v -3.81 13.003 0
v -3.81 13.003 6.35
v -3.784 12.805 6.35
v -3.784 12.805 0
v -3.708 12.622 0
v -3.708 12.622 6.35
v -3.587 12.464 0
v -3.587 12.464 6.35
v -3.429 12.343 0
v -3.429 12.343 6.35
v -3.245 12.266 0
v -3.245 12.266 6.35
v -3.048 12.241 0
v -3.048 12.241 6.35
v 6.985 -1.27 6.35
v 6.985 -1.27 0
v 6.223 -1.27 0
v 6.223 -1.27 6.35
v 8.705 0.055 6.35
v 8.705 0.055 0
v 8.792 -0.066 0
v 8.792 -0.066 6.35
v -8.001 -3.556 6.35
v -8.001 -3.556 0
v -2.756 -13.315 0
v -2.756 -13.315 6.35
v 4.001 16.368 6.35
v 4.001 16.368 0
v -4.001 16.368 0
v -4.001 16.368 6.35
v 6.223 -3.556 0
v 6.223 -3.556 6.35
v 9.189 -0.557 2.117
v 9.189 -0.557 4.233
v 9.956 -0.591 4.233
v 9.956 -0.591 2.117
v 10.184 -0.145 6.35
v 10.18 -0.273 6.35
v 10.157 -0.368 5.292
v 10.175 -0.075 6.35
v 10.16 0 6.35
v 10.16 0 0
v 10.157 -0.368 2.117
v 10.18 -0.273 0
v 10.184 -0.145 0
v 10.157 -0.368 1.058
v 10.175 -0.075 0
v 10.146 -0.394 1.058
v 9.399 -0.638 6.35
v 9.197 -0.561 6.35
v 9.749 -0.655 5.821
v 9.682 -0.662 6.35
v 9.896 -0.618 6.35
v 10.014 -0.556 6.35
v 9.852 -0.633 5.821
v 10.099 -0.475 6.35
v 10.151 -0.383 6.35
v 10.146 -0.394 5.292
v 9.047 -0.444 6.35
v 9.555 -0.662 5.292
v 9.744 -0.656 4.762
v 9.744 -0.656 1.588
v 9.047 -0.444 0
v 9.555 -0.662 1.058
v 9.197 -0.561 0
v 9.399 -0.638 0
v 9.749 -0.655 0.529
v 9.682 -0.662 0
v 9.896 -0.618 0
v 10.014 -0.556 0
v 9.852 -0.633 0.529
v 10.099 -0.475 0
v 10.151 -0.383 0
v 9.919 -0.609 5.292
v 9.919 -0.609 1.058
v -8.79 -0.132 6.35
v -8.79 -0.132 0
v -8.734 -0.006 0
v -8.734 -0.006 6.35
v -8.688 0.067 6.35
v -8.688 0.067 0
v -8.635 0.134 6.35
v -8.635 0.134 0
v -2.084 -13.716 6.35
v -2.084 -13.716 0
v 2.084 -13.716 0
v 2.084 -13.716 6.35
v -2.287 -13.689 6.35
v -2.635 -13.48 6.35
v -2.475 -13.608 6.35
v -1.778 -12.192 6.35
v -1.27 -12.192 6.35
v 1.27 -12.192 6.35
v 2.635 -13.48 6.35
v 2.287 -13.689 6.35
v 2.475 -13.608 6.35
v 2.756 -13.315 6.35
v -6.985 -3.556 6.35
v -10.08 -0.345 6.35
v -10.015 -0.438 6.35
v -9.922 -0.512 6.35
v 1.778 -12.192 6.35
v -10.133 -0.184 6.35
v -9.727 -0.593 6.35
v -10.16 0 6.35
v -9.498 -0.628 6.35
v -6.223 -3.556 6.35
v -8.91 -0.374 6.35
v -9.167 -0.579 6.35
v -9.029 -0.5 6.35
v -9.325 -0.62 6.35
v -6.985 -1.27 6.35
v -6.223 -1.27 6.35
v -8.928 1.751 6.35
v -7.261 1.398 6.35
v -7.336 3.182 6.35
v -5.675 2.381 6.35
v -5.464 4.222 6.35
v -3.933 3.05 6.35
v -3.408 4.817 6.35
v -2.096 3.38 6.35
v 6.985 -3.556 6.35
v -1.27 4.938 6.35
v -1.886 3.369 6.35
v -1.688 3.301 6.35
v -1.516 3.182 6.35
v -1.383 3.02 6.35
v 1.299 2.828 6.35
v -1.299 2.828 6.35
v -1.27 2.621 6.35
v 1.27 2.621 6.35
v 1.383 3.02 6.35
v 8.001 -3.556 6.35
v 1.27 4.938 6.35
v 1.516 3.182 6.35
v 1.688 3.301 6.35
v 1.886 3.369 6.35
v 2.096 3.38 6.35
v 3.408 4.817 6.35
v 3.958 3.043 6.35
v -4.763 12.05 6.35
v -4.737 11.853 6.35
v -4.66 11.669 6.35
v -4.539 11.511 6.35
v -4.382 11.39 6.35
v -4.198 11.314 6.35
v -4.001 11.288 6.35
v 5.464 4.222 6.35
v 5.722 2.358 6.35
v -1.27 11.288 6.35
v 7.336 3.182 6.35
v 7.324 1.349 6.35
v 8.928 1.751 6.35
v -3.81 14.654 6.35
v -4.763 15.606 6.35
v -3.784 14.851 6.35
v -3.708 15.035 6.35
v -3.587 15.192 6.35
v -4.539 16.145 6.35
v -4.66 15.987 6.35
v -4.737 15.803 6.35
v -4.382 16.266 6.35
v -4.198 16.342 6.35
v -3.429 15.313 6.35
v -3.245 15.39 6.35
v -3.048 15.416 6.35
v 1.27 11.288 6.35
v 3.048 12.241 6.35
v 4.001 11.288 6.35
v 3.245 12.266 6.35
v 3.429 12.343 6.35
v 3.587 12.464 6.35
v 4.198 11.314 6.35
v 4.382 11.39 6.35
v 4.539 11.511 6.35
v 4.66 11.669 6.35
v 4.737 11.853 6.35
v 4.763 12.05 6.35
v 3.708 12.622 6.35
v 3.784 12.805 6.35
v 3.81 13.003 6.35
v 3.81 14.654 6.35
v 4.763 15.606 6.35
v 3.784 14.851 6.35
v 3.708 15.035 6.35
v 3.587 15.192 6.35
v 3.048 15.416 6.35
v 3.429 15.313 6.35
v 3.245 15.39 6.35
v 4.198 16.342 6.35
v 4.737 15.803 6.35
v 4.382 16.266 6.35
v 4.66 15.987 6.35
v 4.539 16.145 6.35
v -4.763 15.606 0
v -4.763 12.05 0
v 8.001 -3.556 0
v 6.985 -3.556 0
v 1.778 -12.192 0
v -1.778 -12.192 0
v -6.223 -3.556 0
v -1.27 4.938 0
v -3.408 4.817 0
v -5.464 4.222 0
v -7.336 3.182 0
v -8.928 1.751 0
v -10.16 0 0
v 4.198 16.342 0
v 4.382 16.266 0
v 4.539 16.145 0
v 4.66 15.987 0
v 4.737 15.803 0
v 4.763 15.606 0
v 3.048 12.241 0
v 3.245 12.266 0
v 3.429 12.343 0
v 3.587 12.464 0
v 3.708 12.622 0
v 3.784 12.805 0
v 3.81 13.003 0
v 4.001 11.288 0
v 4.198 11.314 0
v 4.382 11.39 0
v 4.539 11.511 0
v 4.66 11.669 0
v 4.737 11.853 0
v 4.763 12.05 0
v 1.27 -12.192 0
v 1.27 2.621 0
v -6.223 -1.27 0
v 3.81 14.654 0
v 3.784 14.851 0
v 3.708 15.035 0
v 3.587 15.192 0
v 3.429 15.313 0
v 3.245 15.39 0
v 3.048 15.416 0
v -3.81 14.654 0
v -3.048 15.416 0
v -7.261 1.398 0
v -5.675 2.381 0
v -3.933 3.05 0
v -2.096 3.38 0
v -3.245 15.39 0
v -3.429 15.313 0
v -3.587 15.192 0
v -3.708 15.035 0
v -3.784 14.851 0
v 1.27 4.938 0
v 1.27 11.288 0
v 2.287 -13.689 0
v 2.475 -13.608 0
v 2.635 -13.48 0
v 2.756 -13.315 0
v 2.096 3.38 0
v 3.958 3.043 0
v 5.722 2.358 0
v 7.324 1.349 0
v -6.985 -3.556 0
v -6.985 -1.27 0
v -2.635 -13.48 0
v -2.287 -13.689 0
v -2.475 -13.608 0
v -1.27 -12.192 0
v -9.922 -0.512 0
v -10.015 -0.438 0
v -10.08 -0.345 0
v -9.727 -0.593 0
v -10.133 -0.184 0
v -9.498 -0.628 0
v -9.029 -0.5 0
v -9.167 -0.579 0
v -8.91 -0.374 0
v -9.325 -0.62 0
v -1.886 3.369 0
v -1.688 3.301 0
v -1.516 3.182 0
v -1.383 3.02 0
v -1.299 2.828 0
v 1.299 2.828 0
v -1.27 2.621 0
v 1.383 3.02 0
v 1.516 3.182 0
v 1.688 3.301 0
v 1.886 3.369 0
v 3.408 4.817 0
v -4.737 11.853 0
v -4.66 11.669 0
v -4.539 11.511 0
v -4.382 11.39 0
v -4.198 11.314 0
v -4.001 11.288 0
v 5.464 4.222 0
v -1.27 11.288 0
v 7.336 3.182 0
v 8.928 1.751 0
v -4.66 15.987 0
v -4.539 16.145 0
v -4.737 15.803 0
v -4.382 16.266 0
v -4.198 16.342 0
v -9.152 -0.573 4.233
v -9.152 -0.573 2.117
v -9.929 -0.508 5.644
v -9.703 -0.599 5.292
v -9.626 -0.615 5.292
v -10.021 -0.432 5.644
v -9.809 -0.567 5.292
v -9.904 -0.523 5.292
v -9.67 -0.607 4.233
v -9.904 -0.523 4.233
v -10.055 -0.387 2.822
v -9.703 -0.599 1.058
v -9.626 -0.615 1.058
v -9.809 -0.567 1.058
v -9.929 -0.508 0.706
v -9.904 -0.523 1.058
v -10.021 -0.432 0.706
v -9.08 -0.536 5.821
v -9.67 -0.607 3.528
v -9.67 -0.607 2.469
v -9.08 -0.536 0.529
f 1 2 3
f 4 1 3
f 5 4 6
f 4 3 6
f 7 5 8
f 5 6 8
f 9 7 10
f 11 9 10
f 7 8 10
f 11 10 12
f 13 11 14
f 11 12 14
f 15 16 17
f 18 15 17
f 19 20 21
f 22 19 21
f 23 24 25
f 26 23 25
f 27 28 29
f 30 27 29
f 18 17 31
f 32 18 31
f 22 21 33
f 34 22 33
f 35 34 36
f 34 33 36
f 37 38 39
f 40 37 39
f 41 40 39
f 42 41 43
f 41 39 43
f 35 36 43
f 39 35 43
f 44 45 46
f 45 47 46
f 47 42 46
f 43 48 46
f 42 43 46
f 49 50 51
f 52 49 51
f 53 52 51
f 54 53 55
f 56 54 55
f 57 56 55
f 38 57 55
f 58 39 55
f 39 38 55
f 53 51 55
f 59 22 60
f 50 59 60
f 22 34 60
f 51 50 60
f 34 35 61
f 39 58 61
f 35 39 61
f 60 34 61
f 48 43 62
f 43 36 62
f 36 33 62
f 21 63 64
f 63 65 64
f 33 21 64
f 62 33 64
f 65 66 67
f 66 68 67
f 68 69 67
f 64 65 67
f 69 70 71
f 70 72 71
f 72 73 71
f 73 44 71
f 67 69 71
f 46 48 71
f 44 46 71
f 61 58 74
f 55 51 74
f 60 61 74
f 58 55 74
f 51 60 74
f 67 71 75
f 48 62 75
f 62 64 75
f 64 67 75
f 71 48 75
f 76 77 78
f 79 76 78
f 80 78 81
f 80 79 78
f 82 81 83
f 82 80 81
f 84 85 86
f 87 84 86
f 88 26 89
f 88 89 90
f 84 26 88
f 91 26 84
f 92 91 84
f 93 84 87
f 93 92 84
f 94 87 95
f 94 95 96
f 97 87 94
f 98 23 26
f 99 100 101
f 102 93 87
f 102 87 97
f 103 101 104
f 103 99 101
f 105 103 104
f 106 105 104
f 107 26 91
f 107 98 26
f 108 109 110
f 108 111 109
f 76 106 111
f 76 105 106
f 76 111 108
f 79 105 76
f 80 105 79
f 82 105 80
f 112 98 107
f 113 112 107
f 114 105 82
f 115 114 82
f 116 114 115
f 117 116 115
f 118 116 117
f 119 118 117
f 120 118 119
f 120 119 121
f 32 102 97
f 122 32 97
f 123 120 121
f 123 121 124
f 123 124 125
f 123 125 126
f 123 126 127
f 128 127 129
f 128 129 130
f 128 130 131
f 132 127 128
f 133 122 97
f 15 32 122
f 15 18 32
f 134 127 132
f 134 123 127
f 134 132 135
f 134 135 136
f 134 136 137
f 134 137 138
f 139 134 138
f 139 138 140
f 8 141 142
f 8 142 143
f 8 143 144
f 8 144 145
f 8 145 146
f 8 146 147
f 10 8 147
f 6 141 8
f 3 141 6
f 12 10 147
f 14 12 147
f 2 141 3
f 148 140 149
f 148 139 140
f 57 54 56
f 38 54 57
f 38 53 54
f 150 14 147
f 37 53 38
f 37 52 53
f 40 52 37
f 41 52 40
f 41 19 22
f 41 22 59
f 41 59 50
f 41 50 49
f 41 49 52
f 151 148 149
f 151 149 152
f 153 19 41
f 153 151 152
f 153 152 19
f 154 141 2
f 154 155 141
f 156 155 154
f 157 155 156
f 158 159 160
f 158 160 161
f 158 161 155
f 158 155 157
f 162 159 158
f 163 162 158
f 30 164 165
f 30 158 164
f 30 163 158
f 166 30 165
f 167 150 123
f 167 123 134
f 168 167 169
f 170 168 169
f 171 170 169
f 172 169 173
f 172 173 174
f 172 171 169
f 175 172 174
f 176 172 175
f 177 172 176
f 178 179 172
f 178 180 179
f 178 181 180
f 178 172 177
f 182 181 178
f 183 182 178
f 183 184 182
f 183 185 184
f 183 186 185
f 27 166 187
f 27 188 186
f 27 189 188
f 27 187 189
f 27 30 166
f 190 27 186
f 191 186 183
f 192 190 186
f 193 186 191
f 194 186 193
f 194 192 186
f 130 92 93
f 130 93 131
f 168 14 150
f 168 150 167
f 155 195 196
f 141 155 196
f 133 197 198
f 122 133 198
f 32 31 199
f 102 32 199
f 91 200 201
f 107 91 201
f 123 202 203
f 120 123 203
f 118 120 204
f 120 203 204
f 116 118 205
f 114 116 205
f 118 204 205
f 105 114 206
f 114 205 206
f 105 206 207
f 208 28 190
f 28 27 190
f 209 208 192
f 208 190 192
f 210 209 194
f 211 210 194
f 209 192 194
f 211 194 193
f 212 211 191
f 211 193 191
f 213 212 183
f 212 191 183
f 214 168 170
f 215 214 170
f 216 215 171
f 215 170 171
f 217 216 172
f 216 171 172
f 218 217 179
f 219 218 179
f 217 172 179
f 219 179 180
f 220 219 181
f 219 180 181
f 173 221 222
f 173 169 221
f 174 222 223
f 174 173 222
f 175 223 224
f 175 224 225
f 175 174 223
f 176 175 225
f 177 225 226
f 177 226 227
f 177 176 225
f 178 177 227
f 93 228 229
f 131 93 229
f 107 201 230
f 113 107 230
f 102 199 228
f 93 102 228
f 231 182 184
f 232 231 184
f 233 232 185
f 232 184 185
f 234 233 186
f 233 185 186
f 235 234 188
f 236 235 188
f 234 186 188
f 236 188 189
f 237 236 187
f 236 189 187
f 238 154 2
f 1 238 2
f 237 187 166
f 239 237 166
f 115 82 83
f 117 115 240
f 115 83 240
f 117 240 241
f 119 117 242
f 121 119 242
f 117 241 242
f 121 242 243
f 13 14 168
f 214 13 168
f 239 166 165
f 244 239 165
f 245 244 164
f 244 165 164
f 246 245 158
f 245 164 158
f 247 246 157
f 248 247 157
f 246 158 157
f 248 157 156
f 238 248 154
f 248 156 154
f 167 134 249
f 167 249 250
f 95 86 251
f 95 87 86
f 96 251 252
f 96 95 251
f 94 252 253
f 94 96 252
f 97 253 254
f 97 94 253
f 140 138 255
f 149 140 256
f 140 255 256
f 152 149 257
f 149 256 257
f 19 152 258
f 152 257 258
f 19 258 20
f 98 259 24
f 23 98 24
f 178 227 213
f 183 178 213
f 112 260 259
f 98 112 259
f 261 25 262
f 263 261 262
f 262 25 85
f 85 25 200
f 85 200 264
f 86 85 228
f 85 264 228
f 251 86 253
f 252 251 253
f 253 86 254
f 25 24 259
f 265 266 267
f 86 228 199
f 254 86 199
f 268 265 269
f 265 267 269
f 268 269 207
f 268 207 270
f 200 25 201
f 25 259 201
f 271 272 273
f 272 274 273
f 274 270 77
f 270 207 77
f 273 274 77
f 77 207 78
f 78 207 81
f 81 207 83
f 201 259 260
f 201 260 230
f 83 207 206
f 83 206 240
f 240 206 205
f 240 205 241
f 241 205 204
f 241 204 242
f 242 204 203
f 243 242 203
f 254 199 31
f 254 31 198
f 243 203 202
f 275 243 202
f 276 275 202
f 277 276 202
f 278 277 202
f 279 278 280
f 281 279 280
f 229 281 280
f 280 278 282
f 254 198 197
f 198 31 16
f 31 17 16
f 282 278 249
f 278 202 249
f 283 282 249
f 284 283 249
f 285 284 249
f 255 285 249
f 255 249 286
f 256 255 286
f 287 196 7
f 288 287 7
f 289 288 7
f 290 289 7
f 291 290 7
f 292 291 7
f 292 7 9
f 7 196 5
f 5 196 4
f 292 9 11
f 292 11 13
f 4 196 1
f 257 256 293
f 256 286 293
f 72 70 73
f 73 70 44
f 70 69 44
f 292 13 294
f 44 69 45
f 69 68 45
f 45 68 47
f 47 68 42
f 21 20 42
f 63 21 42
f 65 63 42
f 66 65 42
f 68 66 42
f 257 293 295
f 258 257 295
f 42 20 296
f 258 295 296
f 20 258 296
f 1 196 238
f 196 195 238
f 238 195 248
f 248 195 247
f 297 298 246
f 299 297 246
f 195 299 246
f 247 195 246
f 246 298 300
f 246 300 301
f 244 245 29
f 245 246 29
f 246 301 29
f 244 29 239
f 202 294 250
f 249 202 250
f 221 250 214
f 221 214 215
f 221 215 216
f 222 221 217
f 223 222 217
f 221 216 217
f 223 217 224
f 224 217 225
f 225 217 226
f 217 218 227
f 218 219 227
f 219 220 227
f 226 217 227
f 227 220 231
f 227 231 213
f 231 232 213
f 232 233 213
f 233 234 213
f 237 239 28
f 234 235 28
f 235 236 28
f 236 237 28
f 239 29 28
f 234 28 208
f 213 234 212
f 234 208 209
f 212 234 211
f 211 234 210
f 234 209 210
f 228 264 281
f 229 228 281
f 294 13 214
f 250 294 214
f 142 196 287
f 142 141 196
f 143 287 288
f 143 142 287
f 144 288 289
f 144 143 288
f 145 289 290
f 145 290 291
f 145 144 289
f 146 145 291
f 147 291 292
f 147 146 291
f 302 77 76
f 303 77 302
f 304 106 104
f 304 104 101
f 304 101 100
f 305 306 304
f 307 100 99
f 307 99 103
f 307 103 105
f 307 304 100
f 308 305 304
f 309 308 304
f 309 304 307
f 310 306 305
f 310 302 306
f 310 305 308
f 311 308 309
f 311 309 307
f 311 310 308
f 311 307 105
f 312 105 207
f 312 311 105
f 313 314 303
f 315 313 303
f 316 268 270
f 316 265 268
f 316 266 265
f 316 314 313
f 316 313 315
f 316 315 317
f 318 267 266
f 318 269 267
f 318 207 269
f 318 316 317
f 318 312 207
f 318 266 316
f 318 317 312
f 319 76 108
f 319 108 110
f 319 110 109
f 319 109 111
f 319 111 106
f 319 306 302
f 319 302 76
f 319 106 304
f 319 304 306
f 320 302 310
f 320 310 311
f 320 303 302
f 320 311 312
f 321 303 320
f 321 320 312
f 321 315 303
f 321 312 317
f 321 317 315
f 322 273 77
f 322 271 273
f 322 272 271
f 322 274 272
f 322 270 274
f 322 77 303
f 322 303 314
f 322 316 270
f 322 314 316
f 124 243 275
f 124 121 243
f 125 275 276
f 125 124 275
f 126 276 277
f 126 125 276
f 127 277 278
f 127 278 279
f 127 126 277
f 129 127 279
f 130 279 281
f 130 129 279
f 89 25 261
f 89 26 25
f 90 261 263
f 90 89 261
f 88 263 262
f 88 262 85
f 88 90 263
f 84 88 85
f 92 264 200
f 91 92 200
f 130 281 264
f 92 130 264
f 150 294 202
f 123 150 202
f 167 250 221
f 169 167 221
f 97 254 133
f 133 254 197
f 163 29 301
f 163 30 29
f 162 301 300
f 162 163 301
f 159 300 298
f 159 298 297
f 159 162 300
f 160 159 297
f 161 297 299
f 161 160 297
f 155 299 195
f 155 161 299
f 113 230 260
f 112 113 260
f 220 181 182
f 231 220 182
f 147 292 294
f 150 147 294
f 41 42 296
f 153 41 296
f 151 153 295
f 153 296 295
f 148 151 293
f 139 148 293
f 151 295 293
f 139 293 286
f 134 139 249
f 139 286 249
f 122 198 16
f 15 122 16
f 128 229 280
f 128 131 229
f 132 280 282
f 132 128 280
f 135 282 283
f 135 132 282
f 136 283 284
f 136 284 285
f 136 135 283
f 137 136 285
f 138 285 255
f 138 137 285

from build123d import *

# Parameters (mm, degrees)
F1_DEPTH = 6.35
F2_R     = 0.762
F4_DEPTH = 6.3510001


with BuildPart() as f1:
    # F0 (on Top) → F1 (new body)
    with BuildSketch(Plane.XY):
        with BuildLine():
            Line((4.7625, 16.3680184094), (-4.7625, 16.3680184094))
            Line((-4.7625, 16.3680184094), (-4.7625, 11.2880184094))
            Line((-4.7625, 11.2880184094), (-1.27, 11.2880184094))
            Line((-1.27, 11.2880184094), (-1.27, 4.9380184094))
            ThreePointArc((-1.27, 4.9380184094), (-6.4291435291, 3.7546941592), (-10.16, 0))
            add(Edge.make_bspline(
                [(-8.7527767482, 0), (-8.8089559621, -0.2418498758), (-9.0471031461, -0.7278683078), (-10.0843877691, -0.5834050266), (-10.1370594903, -0.1969189085), (-10.16, 0)],
                knots=[0, 0, 0, 0, 0.3394019143, 0.707080255, 1, 1, 1, 1], degree=3))
            ThreePointArc((-8.7527767482, 0), (-5.3825469605, 2.5206872974), (-1.27, 3.4147067439))
            Line((-1.27, 3.4147067439), (-1.27, -12.192))
            Line((-1.27, -12.192), (-1.778, -12.192))
            Line((-1.778, -12.192), (-6.223, -3.556))
            Line((-6.223, -3.556), (-6.223, -1.27))
            Line((-6.223, -1.27), (-6.985, -1.27))
            Line((-6.985, -1.27), (-6.985, -3.556))
            Line((-6.985, -3.556), (-8.001, -3.556))
            Line((-8.001, -3.556), (-2.54, -13.716))
            Line((-2.54, -13.716), (2.54, -13.716))
            Line((2.54, -13.716), (8.001, -3.556))
            Line((8.001, -3.556), (6.985, -3.556))
            Line((6.985, -3.556), (6.985, -1.27))
            Line((6.985, -1.27), (6.223, -1.27))
            Line((6.223, -1.27), (6.223, -3.556))
            Line((6.223, -3.556), (1.778, -12.192))
            Line((1.778, -12.192), (1.27, -12.192))
            Line((1.27, -12.192), (1.27, 3.4147067439))
            ThreePointArc((1.27, 3.4147067439), (5.3825469605, 2.5206872974), (8.7527767482, 0))
            add(Edge.make_bspline(
                [(8.7527767482, 0), (8.8795025593, -0.2082938871), (9.0832410123, -0.668988318), (10.0510359017, -0.7151657897), (10.232657896, -0.2924908845), (10.16, 0)],
                knots=[0, 0, 0, 0, 0.3352638068, 0.68469439, 1, 1, 1, 1], degree=3))
            ThreePointArc((10.16, 0), (6.4291435291, 3.7546941592), (1.27, 4.9380184094))
            Line((1.27, 4.9380184094), (1.27, 11.2880184094))
            Line((1.27, 11.2880184094), (4.7625, 11.2880184094))
            Line((4.7625, 11.2880184094), (4.7625, 16.3680184094))
        make_face()
    extrude(amount=F1_DEPTH)

    # F2
    f2_edges = [f1.edges().sort_by_distance(p)[0] for p in [
        (-2.54, -13.716, 3.175),
        (2.54, -13.716, 3.175),
        (-4.7625, 16.368018, 3.175),
        (-4.7625, 11.288018, 3.175),
        (4.7625, 16.368018, 3.175),
        (4.7625, 11.288018, 3.175),
        (1.27, 3.414707, 3.175),
        (8.752777, 0, 3.175),
        (-8.752777, 0, 3.175),
        (-1.27, 3.414707, 3.175),
    ]]
    fillet(f2_edges, radius=F2_R)

    # F3 (on face) → F4 (cut, through all)
    with BuildSketch(Plane.XY.offset(6.35)):
        with BuildLine():
            Line((-3.048, 12.2405184094), (3.048, 12.2405184094))
            ThreePointArc((3.048, 12.2405184094), (3.5868153673, 12.4637030421), (3.81, 13.0025184094))
            Line((3.81, 13.0025184094), (3.81, 14.6535184094))
            ThreePointArc((3.81, 14.6535184094), (3.5868153673, 15.1923337767), (3.048, 15.4155184094))
            Line((3.048, 15.4155184094), (-3.048, 15.4155184094))
            ThreePointArc((-3.048, 15.4155184094), (-3.5868153673, 15.1923337767), (-3.81, 14.6535184094))
            Line((-3.81, 14.6535184094), (-3.81, 13.0025184094))
            ThreePointArc((-3.81, 13.0025184094), (-3.5868153673, 12.4637030421), (-3.048, 12.2405184094))
        make_face()
    extrude(amount=-F4_DEPTH, mode=Mode.SUBTRACT)


solid = f1.part
